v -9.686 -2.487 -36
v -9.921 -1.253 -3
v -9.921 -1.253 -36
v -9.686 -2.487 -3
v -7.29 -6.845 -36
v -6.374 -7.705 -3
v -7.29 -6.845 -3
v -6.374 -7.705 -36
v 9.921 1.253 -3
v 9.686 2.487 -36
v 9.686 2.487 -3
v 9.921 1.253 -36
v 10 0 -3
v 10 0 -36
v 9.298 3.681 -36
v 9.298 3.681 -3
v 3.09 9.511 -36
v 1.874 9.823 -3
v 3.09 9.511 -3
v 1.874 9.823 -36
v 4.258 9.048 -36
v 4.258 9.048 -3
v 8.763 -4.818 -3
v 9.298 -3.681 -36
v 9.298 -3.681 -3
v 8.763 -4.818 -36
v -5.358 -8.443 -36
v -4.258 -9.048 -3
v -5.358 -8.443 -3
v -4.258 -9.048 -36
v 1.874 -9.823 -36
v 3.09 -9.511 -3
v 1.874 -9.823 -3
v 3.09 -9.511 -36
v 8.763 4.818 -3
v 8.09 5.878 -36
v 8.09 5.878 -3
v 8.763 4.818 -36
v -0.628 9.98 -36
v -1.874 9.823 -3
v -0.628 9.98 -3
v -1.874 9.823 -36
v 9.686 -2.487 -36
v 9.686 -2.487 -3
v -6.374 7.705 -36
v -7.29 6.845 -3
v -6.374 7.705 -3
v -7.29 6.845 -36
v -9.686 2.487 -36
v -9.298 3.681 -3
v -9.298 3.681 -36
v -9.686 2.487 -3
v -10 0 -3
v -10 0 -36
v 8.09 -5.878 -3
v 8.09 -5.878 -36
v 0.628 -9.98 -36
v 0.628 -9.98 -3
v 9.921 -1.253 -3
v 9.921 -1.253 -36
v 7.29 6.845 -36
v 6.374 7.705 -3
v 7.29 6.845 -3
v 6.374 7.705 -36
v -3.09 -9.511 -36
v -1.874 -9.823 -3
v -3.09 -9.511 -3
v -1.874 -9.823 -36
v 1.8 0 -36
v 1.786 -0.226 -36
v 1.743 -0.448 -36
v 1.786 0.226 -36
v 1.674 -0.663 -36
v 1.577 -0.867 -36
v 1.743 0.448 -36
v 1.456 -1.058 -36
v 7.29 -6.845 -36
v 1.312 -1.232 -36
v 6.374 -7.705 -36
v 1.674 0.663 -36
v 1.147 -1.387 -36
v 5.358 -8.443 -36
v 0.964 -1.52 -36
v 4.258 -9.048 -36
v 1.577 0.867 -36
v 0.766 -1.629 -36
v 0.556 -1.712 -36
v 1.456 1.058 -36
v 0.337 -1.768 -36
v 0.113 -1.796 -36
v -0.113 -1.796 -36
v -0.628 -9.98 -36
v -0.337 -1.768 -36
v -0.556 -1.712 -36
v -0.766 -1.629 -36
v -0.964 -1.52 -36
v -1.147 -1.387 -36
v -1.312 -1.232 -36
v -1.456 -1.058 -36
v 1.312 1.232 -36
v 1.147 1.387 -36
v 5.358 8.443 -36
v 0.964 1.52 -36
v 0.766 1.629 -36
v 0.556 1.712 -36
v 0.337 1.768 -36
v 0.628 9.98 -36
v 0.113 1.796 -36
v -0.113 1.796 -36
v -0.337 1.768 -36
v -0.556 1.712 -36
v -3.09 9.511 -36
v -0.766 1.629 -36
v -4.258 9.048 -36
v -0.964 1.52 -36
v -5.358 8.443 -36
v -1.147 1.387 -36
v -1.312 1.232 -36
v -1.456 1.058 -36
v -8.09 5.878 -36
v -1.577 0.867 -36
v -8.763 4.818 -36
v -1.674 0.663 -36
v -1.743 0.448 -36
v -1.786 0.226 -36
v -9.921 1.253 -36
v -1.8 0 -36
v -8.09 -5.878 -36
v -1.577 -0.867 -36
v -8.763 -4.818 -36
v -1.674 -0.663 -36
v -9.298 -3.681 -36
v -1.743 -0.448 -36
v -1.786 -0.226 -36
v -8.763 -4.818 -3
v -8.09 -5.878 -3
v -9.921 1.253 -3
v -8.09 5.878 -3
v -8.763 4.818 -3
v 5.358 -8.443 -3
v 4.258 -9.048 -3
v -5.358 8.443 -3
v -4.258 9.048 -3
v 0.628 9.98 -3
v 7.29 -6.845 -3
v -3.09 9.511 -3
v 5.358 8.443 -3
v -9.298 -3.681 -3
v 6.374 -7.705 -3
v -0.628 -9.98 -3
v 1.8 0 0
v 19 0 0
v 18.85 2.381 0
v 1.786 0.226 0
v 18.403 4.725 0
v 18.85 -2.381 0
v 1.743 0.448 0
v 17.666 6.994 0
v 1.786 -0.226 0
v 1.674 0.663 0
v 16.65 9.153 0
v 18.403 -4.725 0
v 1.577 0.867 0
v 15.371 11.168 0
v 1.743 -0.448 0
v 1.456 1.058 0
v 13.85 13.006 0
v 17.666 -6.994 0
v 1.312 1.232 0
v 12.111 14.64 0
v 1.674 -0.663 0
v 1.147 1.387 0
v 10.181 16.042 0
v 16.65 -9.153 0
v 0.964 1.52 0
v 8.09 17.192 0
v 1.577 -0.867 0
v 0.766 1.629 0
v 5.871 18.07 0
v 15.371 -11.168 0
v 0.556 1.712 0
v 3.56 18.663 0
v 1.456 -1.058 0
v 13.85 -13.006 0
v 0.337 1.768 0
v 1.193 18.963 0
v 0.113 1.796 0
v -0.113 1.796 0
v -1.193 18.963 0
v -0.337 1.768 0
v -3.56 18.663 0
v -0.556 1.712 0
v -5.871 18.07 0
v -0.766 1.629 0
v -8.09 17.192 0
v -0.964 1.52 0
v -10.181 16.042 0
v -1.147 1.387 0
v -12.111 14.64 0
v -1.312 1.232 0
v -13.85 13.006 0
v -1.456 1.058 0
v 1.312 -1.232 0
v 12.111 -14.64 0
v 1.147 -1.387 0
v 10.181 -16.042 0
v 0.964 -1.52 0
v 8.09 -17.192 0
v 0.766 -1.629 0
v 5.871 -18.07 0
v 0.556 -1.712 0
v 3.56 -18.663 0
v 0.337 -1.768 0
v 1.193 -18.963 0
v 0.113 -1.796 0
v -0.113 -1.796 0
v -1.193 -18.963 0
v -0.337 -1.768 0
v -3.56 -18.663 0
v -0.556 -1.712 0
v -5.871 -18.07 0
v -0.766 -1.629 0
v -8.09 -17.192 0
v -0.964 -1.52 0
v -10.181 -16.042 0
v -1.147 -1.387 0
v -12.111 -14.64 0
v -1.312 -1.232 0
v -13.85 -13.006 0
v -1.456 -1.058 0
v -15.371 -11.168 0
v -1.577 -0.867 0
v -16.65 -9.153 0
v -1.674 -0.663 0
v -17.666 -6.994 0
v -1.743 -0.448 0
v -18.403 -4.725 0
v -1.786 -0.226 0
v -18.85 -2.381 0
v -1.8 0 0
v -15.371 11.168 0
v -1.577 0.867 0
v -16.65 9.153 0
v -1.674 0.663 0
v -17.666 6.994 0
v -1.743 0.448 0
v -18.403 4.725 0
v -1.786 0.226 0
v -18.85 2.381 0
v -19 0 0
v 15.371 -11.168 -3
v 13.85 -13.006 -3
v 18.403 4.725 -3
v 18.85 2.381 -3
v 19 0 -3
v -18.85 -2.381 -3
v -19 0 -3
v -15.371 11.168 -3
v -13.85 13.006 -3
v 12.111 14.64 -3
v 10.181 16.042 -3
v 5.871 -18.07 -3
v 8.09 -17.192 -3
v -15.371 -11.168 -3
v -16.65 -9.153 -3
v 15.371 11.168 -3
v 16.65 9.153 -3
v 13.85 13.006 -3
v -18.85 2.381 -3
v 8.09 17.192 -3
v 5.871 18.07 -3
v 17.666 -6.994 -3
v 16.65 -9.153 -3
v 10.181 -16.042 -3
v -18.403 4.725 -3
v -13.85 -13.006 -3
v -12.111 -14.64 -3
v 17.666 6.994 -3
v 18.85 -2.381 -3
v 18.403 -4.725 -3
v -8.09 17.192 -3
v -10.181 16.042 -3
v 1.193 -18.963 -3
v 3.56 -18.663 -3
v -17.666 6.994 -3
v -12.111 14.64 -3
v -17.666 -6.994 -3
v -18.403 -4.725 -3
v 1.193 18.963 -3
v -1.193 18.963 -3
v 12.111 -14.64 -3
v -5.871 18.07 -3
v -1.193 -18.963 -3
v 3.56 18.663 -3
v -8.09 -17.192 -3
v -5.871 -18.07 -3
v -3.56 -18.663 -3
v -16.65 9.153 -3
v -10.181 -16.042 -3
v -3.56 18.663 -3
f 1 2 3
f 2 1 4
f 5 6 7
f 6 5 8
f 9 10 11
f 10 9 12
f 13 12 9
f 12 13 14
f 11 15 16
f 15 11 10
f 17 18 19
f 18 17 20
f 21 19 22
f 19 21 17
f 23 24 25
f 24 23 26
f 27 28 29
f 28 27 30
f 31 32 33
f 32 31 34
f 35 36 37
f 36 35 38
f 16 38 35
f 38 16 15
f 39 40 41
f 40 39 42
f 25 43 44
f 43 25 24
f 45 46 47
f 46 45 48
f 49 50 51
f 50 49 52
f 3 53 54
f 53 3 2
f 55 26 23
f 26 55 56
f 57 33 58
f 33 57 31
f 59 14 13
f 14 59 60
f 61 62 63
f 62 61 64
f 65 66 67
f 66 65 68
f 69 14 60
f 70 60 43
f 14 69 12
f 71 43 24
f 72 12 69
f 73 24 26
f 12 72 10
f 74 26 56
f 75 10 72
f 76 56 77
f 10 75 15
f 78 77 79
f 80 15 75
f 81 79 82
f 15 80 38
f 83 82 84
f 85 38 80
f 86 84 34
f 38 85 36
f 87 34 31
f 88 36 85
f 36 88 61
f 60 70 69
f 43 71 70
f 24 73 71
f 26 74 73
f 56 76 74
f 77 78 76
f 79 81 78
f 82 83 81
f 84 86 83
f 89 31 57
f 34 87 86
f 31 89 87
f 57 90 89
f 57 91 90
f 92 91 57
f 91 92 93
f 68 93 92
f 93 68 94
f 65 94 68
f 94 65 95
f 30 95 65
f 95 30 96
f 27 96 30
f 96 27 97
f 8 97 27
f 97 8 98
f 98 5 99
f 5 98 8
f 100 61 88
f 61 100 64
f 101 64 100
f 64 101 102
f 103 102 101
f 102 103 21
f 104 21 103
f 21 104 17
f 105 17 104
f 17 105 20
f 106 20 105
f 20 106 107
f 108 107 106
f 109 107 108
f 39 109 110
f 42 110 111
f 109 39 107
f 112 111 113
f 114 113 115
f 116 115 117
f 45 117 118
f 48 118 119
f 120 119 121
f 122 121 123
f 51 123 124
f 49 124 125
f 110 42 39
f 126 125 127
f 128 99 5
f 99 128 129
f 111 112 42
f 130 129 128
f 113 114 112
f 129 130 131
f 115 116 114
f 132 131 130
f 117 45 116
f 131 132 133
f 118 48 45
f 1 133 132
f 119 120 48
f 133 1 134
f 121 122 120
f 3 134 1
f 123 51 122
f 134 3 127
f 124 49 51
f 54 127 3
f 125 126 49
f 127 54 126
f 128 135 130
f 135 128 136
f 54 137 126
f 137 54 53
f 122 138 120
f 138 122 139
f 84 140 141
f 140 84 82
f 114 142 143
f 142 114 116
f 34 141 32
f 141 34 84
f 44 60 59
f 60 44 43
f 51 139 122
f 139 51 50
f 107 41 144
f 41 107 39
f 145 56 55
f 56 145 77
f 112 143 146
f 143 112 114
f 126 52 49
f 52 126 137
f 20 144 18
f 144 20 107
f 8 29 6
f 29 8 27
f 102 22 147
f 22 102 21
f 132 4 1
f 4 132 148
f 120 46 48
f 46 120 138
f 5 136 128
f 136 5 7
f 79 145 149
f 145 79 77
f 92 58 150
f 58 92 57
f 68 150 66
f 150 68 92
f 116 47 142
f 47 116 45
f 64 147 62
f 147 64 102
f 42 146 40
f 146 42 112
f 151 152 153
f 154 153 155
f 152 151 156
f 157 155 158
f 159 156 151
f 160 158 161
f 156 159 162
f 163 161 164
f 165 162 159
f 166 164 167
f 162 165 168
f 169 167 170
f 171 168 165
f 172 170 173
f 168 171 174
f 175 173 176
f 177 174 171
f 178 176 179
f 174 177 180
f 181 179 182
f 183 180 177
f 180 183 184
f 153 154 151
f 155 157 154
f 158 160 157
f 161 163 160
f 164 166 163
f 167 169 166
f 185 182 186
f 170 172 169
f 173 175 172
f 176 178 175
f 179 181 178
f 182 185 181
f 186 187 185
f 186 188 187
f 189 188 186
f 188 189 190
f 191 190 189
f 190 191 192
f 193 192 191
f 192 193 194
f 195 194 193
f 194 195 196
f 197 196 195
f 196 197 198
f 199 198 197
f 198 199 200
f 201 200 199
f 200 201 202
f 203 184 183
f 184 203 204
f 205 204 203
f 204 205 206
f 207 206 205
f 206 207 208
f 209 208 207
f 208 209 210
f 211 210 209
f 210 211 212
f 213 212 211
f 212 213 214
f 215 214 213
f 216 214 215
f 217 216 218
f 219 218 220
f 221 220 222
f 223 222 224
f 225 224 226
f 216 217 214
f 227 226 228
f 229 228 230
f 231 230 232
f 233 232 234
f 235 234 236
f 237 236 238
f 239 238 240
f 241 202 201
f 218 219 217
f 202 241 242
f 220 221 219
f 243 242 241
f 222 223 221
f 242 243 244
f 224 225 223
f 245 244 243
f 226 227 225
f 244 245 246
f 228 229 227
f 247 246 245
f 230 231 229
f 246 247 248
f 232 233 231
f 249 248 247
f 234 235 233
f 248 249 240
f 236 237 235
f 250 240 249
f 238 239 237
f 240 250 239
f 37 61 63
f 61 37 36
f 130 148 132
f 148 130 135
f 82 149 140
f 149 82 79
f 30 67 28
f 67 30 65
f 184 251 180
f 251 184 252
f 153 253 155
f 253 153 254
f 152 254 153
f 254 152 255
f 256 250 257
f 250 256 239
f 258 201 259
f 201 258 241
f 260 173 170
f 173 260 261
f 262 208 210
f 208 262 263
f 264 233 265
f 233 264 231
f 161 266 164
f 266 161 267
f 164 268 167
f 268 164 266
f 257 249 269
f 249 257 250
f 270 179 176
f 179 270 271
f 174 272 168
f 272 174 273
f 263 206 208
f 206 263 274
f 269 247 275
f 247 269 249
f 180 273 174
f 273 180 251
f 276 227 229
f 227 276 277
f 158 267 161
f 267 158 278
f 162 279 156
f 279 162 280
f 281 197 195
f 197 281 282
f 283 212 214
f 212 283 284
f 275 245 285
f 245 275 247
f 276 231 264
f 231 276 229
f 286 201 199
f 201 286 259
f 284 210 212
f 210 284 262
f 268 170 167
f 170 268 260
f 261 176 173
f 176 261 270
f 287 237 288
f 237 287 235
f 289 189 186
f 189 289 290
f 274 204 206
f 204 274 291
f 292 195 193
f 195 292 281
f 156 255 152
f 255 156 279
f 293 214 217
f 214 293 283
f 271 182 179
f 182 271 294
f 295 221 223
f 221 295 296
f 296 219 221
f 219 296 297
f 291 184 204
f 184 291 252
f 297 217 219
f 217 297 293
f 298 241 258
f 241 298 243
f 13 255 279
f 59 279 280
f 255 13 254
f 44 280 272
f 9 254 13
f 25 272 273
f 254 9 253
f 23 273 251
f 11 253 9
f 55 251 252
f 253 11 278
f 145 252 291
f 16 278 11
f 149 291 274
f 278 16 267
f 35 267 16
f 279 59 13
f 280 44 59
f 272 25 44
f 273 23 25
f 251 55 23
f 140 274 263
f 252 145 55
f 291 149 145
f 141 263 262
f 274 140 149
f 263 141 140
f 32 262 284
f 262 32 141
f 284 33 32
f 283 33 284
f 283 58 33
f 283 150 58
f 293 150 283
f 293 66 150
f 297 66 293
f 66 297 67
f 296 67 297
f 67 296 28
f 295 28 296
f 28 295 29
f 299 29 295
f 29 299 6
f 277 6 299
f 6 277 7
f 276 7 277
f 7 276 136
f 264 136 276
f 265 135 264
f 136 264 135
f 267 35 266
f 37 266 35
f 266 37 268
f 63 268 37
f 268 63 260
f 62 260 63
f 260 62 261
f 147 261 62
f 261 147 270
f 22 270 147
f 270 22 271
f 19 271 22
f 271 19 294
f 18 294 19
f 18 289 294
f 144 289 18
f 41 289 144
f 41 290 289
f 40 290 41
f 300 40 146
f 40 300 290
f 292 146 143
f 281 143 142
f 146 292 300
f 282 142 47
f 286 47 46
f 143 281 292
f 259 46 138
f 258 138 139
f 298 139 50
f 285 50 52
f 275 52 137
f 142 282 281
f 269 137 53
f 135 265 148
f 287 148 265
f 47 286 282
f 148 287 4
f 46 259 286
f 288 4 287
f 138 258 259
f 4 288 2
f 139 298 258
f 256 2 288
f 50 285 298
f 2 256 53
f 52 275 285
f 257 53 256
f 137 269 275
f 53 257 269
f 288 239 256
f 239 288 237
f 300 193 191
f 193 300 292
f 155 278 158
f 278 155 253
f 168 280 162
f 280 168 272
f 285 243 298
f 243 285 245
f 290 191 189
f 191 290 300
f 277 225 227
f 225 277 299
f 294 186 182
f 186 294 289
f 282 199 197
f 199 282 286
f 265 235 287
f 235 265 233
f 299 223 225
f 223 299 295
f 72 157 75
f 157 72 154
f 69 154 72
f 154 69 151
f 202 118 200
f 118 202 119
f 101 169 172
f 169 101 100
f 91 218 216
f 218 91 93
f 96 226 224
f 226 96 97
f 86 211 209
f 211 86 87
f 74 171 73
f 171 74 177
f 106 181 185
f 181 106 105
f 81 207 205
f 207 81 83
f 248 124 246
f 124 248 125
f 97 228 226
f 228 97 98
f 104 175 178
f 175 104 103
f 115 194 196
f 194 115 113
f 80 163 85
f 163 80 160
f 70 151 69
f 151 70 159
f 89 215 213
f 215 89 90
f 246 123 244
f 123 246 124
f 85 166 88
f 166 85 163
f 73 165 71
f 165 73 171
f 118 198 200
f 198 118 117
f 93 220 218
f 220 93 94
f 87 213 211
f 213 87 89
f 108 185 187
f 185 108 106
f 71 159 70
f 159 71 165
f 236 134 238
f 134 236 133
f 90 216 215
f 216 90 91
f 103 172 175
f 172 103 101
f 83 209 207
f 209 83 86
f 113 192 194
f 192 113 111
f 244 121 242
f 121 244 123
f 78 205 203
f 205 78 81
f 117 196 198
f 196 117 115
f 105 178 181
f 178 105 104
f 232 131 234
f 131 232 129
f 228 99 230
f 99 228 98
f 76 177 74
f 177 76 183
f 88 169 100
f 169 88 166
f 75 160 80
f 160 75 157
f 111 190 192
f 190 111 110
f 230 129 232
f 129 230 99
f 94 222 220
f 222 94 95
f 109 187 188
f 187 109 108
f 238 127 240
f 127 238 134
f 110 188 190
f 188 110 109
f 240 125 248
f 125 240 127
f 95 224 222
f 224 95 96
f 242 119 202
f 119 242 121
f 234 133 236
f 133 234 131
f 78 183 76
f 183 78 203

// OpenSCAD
$fn = 50;


difference() {
	union() {
		translate(v = [0, 0, -36.0000000000]) {
			cylinder(h = 36, r = 10.0000000000);
		}
		translate(v = [0, 0, -3.0000000000]) {
			cylinder(h = 3, r = 19.0000000000);
		}
	}
	union() {
		#translate(v = [0, 0, -36]) {
			cylinder(h = 36, r = 1.8000000000);
		}
	}
}
